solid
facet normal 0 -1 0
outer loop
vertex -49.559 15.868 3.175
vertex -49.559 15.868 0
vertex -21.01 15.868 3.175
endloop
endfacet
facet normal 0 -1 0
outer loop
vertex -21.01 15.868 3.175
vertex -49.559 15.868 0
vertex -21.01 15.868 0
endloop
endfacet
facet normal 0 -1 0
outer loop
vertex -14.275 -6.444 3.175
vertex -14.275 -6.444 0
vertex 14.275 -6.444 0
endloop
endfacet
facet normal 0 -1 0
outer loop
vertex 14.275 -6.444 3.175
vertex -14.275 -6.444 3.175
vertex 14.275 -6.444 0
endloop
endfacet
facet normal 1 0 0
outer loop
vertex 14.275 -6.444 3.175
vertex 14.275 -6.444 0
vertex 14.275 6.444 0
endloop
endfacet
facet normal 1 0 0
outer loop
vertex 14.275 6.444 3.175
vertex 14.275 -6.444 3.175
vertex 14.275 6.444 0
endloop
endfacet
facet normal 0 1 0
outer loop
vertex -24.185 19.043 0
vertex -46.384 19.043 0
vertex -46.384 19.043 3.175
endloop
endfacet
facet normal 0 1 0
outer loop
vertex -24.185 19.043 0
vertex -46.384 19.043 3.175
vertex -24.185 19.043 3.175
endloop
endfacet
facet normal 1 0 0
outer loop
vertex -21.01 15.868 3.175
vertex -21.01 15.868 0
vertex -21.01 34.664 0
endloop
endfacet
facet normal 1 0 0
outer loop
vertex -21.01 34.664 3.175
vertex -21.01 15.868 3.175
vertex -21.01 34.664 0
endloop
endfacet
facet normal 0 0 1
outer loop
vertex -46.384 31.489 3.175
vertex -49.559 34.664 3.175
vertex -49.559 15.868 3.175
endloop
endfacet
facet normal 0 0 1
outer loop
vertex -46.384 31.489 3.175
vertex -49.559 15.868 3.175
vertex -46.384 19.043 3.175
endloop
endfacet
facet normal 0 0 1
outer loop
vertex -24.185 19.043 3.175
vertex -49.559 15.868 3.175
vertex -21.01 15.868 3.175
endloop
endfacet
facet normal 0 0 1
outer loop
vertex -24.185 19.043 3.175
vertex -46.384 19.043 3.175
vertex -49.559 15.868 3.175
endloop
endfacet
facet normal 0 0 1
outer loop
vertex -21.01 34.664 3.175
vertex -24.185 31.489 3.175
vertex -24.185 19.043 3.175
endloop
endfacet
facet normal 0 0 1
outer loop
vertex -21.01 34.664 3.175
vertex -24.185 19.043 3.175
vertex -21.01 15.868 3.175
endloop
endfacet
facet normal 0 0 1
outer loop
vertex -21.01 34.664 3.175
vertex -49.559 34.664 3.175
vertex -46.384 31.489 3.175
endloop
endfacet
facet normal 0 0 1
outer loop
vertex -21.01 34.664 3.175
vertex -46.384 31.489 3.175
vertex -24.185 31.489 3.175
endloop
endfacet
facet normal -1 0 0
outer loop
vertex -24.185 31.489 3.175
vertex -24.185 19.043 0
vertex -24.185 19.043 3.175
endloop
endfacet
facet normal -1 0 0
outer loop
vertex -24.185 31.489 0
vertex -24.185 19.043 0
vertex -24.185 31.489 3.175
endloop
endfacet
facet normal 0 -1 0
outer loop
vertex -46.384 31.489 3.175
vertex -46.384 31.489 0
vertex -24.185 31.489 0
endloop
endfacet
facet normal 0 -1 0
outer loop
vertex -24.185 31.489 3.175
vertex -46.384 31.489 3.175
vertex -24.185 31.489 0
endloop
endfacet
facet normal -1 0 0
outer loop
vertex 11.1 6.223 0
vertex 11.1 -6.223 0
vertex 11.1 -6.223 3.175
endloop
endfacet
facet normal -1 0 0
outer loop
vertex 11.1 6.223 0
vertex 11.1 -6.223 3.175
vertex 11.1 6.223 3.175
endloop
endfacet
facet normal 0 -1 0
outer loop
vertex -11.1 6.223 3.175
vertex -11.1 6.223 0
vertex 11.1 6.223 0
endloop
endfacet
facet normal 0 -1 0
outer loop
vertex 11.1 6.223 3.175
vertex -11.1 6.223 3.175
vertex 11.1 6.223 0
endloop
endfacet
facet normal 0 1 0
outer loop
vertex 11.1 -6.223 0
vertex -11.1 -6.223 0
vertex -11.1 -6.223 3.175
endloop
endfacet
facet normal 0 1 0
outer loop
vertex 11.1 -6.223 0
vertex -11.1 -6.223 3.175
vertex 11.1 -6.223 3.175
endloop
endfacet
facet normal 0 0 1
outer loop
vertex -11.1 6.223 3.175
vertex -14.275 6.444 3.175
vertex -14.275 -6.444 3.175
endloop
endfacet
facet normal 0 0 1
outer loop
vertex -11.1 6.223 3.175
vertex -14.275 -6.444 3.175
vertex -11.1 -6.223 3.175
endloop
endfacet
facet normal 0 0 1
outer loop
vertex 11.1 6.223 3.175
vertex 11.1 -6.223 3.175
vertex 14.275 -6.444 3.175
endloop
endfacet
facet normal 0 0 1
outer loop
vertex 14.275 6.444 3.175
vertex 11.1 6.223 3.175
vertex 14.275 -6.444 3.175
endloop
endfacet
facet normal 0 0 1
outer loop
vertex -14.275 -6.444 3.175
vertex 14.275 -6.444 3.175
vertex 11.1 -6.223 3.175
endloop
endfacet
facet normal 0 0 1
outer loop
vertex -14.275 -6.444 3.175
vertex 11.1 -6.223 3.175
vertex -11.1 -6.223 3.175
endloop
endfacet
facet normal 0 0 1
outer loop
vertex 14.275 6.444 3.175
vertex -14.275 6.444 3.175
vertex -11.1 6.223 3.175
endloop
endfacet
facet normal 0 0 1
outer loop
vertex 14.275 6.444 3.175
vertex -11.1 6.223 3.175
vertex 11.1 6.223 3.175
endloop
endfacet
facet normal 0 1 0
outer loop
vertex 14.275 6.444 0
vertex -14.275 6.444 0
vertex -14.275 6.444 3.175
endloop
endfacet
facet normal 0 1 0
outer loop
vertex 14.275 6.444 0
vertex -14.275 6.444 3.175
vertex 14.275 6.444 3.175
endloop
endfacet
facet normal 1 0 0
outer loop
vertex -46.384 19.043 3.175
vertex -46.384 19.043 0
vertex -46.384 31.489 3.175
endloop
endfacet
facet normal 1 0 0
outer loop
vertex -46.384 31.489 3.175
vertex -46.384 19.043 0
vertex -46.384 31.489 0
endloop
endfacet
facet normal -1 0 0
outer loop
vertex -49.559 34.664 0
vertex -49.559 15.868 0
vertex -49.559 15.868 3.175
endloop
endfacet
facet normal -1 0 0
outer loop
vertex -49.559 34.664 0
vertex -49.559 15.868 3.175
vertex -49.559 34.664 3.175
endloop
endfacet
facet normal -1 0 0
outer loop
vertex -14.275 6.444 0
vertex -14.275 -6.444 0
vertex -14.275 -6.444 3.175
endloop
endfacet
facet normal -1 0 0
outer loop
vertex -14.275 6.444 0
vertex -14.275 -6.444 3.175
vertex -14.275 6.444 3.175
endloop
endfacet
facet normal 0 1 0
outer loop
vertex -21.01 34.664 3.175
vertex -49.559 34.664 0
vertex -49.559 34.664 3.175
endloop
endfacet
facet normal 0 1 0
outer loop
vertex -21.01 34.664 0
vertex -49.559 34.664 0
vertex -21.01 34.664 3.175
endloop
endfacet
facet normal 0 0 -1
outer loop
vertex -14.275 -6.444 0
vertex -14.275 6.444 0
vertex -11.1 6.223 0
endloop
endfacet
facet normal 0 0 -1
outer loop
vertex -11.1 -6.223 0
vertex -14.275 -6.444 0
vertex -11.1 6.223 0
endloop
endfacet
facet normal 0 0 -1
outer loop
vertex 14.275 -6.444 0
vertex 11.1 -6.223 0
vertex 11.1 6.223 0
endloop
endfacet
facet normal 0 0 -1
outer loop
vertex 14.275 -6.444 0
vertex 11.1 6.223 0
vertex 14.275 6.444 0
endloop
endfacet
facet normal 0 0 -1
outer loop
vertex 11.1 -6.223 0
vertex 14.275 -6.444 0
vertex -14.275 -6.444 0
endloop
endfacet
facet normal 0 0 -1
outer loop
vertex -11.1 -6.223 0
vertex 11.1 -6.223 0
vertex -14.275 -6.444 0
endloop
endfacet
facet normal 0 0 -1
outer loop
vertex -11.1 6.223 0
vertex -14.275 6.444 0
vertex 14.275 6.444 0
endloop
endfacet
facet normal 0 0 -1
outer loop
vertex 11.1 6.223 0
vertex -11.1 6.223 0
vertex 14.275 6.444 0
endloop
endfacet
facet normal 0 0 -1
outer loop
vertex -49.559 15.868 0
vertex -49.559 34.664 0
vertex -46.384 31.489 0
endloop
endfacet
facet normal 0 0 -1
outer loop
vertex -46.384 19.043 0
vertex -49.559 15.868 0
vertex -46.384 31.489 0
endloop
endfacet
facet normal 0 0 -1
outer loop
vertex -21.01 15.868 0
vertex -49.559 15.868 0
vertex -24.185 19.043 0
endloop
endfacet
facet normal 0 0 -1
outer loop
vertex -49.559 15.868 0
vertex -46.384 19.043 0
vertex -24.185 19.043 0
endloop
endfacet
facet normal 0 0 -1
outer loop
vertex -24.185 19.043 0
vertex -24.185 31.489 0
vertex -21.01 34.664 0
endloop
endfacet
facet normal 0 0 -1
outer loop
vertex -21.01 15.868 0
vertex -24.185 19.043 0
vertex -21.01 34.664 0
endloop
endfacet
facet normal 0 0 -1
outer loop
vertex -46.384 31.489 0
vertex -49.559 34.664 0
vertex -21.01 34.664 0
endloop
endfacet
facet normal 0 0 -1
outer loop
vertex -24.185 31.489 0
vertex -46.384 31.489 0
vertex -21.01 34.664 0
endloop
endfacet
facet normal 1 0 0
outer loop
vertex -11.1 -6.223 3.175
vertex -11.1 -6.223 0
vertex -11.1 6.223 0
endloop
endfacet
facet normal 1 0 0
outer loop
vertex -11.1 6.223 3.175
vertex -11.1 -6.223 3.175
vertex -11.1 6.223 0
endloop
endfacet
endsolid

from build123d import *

# Parameters (mm, degrees)
F0_W     = 28.5496
F0_H     = 12.8888987312
F0_W_2   = 22.1996
F0_H_2   = 12.446
F1_DEPTH = 3.175
F0_H_3   = 18.796
F2_DEPTH = 3.175


with BuildPart() as f1:
    # F0 (on Top) → F1 (new body)
    with BuildSketch(Plane.XY):
        Rectangle(F0_W, F0_H)
        Rectangle(F0_W_2, F0_H_2, mode=Mode.SUBTRACT)
    extrude(amount=F1_DEPTH)


with BuildPart() as f2:
    # F0 (on Top) → F2 (new body)
    with BuildSketch(Plane.XY):
        with Locations((-35.2845547821, 25.2655620637)):
            Rectangle(F0_W, F0_H_3)
        with Locations((-35.2845547821, 25.2655620637)):
            Rectangle(F0_W_2, F0_H_2, mode=Mode.SUBTRACT)
    extrude(amount=F2_DEPTH)


solid = Compound([f1.part, f2.part])
